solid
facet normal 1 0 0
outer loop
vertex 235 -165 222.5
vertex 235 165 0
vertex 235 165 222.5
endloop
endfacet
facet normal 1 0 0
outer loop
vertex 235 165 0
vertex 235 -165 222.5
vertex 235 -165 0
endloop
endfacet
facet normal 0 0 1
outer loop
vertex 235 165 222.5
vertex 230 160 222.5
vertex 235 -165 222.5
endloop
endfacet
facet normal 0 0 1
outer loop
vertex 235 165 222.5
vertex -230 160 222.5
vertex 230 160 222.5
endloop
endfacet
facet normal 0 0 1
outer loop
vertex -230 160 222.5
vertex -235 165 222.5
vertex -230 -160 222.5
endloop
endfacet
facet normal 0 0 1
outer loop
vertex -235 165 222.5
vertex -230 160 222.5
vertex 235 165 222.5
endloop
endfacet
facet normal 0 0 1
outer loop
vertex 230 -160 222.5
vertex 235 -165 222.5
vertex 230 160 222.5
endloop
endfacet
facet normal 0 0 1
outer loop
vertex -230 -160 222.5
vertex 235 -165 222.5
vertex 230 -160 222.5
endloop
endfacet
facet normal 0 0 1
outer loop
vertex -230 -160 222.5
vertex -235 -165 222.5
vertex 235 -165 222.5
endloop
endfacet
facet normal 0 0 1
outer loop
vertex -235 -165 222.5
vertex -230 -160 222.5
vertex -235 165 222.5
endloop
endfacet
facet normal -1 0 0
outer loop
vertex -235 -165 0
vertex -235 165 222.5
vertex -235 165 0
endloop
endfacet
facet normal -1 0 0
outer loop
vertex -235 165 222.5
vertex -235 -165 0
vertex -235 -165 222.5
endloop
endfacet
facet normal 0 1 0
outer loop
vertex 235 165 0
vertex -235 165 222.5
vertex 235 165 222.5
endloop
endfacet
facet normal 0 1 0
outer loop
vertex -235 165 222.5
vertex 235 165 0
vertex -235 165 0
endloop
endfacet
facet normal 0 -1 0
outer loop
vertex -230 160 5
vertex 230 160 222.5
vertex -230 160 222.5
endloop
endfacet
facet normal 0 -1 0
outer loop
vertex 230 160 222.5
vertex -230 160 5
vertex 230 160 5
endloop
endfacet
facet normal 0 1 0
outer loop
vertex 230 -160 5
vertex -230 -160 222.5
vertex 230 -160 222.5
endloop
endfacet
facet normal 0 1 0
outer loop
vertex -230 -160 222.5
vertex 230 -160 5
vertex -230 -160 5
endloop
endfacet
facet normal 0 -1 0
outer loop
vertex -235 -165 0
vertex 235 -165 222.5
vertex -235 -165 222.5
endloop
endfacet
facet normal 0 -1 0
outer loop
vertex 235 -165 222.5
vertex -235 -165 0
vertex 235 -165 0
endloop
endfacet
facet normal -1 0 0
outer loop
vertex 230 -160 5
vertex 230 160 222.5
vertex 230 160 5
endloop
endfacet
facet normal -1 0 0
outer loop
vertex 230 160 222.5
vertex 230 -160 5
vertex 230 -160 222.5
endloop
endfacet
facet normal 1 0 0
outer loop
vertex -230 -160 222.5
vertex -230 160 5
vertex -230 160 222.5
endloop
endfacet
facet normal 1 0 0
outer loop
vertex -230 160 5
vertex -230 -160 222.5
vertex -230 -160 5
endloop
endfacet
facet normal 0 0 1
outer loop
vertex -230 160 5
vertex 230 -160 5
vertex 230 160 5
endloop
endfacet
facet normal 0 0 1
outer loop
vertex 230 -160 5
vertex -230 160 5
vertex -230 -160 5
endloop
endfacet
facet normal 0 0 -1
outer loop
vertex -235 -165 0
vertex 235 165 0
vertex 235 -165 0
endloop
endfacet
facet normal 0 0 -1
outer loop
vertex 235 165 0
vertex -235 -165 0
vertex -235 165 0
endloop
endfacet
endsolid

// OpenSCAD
module Canasto(length = 470, width = 330, height=220, thickness=5){
    color([.25,.25,.25])
    translate([0, 0, thickness/2]){
        cube([length, width, thickness], center=true);
        
        translate([0, 0, height/2]){
            
            for (y=[1, -1]) {
                translate([0, y*(width/2-thickness/2), 0])
                cube([length, thickness, height], center=true);
            }
            for (x=[1, -1]) {
                translate([x*(length/2-thickness/2), 0])
                cube([thickness, width, height], center=true);
            }
        }
    }
}


Canasto();
